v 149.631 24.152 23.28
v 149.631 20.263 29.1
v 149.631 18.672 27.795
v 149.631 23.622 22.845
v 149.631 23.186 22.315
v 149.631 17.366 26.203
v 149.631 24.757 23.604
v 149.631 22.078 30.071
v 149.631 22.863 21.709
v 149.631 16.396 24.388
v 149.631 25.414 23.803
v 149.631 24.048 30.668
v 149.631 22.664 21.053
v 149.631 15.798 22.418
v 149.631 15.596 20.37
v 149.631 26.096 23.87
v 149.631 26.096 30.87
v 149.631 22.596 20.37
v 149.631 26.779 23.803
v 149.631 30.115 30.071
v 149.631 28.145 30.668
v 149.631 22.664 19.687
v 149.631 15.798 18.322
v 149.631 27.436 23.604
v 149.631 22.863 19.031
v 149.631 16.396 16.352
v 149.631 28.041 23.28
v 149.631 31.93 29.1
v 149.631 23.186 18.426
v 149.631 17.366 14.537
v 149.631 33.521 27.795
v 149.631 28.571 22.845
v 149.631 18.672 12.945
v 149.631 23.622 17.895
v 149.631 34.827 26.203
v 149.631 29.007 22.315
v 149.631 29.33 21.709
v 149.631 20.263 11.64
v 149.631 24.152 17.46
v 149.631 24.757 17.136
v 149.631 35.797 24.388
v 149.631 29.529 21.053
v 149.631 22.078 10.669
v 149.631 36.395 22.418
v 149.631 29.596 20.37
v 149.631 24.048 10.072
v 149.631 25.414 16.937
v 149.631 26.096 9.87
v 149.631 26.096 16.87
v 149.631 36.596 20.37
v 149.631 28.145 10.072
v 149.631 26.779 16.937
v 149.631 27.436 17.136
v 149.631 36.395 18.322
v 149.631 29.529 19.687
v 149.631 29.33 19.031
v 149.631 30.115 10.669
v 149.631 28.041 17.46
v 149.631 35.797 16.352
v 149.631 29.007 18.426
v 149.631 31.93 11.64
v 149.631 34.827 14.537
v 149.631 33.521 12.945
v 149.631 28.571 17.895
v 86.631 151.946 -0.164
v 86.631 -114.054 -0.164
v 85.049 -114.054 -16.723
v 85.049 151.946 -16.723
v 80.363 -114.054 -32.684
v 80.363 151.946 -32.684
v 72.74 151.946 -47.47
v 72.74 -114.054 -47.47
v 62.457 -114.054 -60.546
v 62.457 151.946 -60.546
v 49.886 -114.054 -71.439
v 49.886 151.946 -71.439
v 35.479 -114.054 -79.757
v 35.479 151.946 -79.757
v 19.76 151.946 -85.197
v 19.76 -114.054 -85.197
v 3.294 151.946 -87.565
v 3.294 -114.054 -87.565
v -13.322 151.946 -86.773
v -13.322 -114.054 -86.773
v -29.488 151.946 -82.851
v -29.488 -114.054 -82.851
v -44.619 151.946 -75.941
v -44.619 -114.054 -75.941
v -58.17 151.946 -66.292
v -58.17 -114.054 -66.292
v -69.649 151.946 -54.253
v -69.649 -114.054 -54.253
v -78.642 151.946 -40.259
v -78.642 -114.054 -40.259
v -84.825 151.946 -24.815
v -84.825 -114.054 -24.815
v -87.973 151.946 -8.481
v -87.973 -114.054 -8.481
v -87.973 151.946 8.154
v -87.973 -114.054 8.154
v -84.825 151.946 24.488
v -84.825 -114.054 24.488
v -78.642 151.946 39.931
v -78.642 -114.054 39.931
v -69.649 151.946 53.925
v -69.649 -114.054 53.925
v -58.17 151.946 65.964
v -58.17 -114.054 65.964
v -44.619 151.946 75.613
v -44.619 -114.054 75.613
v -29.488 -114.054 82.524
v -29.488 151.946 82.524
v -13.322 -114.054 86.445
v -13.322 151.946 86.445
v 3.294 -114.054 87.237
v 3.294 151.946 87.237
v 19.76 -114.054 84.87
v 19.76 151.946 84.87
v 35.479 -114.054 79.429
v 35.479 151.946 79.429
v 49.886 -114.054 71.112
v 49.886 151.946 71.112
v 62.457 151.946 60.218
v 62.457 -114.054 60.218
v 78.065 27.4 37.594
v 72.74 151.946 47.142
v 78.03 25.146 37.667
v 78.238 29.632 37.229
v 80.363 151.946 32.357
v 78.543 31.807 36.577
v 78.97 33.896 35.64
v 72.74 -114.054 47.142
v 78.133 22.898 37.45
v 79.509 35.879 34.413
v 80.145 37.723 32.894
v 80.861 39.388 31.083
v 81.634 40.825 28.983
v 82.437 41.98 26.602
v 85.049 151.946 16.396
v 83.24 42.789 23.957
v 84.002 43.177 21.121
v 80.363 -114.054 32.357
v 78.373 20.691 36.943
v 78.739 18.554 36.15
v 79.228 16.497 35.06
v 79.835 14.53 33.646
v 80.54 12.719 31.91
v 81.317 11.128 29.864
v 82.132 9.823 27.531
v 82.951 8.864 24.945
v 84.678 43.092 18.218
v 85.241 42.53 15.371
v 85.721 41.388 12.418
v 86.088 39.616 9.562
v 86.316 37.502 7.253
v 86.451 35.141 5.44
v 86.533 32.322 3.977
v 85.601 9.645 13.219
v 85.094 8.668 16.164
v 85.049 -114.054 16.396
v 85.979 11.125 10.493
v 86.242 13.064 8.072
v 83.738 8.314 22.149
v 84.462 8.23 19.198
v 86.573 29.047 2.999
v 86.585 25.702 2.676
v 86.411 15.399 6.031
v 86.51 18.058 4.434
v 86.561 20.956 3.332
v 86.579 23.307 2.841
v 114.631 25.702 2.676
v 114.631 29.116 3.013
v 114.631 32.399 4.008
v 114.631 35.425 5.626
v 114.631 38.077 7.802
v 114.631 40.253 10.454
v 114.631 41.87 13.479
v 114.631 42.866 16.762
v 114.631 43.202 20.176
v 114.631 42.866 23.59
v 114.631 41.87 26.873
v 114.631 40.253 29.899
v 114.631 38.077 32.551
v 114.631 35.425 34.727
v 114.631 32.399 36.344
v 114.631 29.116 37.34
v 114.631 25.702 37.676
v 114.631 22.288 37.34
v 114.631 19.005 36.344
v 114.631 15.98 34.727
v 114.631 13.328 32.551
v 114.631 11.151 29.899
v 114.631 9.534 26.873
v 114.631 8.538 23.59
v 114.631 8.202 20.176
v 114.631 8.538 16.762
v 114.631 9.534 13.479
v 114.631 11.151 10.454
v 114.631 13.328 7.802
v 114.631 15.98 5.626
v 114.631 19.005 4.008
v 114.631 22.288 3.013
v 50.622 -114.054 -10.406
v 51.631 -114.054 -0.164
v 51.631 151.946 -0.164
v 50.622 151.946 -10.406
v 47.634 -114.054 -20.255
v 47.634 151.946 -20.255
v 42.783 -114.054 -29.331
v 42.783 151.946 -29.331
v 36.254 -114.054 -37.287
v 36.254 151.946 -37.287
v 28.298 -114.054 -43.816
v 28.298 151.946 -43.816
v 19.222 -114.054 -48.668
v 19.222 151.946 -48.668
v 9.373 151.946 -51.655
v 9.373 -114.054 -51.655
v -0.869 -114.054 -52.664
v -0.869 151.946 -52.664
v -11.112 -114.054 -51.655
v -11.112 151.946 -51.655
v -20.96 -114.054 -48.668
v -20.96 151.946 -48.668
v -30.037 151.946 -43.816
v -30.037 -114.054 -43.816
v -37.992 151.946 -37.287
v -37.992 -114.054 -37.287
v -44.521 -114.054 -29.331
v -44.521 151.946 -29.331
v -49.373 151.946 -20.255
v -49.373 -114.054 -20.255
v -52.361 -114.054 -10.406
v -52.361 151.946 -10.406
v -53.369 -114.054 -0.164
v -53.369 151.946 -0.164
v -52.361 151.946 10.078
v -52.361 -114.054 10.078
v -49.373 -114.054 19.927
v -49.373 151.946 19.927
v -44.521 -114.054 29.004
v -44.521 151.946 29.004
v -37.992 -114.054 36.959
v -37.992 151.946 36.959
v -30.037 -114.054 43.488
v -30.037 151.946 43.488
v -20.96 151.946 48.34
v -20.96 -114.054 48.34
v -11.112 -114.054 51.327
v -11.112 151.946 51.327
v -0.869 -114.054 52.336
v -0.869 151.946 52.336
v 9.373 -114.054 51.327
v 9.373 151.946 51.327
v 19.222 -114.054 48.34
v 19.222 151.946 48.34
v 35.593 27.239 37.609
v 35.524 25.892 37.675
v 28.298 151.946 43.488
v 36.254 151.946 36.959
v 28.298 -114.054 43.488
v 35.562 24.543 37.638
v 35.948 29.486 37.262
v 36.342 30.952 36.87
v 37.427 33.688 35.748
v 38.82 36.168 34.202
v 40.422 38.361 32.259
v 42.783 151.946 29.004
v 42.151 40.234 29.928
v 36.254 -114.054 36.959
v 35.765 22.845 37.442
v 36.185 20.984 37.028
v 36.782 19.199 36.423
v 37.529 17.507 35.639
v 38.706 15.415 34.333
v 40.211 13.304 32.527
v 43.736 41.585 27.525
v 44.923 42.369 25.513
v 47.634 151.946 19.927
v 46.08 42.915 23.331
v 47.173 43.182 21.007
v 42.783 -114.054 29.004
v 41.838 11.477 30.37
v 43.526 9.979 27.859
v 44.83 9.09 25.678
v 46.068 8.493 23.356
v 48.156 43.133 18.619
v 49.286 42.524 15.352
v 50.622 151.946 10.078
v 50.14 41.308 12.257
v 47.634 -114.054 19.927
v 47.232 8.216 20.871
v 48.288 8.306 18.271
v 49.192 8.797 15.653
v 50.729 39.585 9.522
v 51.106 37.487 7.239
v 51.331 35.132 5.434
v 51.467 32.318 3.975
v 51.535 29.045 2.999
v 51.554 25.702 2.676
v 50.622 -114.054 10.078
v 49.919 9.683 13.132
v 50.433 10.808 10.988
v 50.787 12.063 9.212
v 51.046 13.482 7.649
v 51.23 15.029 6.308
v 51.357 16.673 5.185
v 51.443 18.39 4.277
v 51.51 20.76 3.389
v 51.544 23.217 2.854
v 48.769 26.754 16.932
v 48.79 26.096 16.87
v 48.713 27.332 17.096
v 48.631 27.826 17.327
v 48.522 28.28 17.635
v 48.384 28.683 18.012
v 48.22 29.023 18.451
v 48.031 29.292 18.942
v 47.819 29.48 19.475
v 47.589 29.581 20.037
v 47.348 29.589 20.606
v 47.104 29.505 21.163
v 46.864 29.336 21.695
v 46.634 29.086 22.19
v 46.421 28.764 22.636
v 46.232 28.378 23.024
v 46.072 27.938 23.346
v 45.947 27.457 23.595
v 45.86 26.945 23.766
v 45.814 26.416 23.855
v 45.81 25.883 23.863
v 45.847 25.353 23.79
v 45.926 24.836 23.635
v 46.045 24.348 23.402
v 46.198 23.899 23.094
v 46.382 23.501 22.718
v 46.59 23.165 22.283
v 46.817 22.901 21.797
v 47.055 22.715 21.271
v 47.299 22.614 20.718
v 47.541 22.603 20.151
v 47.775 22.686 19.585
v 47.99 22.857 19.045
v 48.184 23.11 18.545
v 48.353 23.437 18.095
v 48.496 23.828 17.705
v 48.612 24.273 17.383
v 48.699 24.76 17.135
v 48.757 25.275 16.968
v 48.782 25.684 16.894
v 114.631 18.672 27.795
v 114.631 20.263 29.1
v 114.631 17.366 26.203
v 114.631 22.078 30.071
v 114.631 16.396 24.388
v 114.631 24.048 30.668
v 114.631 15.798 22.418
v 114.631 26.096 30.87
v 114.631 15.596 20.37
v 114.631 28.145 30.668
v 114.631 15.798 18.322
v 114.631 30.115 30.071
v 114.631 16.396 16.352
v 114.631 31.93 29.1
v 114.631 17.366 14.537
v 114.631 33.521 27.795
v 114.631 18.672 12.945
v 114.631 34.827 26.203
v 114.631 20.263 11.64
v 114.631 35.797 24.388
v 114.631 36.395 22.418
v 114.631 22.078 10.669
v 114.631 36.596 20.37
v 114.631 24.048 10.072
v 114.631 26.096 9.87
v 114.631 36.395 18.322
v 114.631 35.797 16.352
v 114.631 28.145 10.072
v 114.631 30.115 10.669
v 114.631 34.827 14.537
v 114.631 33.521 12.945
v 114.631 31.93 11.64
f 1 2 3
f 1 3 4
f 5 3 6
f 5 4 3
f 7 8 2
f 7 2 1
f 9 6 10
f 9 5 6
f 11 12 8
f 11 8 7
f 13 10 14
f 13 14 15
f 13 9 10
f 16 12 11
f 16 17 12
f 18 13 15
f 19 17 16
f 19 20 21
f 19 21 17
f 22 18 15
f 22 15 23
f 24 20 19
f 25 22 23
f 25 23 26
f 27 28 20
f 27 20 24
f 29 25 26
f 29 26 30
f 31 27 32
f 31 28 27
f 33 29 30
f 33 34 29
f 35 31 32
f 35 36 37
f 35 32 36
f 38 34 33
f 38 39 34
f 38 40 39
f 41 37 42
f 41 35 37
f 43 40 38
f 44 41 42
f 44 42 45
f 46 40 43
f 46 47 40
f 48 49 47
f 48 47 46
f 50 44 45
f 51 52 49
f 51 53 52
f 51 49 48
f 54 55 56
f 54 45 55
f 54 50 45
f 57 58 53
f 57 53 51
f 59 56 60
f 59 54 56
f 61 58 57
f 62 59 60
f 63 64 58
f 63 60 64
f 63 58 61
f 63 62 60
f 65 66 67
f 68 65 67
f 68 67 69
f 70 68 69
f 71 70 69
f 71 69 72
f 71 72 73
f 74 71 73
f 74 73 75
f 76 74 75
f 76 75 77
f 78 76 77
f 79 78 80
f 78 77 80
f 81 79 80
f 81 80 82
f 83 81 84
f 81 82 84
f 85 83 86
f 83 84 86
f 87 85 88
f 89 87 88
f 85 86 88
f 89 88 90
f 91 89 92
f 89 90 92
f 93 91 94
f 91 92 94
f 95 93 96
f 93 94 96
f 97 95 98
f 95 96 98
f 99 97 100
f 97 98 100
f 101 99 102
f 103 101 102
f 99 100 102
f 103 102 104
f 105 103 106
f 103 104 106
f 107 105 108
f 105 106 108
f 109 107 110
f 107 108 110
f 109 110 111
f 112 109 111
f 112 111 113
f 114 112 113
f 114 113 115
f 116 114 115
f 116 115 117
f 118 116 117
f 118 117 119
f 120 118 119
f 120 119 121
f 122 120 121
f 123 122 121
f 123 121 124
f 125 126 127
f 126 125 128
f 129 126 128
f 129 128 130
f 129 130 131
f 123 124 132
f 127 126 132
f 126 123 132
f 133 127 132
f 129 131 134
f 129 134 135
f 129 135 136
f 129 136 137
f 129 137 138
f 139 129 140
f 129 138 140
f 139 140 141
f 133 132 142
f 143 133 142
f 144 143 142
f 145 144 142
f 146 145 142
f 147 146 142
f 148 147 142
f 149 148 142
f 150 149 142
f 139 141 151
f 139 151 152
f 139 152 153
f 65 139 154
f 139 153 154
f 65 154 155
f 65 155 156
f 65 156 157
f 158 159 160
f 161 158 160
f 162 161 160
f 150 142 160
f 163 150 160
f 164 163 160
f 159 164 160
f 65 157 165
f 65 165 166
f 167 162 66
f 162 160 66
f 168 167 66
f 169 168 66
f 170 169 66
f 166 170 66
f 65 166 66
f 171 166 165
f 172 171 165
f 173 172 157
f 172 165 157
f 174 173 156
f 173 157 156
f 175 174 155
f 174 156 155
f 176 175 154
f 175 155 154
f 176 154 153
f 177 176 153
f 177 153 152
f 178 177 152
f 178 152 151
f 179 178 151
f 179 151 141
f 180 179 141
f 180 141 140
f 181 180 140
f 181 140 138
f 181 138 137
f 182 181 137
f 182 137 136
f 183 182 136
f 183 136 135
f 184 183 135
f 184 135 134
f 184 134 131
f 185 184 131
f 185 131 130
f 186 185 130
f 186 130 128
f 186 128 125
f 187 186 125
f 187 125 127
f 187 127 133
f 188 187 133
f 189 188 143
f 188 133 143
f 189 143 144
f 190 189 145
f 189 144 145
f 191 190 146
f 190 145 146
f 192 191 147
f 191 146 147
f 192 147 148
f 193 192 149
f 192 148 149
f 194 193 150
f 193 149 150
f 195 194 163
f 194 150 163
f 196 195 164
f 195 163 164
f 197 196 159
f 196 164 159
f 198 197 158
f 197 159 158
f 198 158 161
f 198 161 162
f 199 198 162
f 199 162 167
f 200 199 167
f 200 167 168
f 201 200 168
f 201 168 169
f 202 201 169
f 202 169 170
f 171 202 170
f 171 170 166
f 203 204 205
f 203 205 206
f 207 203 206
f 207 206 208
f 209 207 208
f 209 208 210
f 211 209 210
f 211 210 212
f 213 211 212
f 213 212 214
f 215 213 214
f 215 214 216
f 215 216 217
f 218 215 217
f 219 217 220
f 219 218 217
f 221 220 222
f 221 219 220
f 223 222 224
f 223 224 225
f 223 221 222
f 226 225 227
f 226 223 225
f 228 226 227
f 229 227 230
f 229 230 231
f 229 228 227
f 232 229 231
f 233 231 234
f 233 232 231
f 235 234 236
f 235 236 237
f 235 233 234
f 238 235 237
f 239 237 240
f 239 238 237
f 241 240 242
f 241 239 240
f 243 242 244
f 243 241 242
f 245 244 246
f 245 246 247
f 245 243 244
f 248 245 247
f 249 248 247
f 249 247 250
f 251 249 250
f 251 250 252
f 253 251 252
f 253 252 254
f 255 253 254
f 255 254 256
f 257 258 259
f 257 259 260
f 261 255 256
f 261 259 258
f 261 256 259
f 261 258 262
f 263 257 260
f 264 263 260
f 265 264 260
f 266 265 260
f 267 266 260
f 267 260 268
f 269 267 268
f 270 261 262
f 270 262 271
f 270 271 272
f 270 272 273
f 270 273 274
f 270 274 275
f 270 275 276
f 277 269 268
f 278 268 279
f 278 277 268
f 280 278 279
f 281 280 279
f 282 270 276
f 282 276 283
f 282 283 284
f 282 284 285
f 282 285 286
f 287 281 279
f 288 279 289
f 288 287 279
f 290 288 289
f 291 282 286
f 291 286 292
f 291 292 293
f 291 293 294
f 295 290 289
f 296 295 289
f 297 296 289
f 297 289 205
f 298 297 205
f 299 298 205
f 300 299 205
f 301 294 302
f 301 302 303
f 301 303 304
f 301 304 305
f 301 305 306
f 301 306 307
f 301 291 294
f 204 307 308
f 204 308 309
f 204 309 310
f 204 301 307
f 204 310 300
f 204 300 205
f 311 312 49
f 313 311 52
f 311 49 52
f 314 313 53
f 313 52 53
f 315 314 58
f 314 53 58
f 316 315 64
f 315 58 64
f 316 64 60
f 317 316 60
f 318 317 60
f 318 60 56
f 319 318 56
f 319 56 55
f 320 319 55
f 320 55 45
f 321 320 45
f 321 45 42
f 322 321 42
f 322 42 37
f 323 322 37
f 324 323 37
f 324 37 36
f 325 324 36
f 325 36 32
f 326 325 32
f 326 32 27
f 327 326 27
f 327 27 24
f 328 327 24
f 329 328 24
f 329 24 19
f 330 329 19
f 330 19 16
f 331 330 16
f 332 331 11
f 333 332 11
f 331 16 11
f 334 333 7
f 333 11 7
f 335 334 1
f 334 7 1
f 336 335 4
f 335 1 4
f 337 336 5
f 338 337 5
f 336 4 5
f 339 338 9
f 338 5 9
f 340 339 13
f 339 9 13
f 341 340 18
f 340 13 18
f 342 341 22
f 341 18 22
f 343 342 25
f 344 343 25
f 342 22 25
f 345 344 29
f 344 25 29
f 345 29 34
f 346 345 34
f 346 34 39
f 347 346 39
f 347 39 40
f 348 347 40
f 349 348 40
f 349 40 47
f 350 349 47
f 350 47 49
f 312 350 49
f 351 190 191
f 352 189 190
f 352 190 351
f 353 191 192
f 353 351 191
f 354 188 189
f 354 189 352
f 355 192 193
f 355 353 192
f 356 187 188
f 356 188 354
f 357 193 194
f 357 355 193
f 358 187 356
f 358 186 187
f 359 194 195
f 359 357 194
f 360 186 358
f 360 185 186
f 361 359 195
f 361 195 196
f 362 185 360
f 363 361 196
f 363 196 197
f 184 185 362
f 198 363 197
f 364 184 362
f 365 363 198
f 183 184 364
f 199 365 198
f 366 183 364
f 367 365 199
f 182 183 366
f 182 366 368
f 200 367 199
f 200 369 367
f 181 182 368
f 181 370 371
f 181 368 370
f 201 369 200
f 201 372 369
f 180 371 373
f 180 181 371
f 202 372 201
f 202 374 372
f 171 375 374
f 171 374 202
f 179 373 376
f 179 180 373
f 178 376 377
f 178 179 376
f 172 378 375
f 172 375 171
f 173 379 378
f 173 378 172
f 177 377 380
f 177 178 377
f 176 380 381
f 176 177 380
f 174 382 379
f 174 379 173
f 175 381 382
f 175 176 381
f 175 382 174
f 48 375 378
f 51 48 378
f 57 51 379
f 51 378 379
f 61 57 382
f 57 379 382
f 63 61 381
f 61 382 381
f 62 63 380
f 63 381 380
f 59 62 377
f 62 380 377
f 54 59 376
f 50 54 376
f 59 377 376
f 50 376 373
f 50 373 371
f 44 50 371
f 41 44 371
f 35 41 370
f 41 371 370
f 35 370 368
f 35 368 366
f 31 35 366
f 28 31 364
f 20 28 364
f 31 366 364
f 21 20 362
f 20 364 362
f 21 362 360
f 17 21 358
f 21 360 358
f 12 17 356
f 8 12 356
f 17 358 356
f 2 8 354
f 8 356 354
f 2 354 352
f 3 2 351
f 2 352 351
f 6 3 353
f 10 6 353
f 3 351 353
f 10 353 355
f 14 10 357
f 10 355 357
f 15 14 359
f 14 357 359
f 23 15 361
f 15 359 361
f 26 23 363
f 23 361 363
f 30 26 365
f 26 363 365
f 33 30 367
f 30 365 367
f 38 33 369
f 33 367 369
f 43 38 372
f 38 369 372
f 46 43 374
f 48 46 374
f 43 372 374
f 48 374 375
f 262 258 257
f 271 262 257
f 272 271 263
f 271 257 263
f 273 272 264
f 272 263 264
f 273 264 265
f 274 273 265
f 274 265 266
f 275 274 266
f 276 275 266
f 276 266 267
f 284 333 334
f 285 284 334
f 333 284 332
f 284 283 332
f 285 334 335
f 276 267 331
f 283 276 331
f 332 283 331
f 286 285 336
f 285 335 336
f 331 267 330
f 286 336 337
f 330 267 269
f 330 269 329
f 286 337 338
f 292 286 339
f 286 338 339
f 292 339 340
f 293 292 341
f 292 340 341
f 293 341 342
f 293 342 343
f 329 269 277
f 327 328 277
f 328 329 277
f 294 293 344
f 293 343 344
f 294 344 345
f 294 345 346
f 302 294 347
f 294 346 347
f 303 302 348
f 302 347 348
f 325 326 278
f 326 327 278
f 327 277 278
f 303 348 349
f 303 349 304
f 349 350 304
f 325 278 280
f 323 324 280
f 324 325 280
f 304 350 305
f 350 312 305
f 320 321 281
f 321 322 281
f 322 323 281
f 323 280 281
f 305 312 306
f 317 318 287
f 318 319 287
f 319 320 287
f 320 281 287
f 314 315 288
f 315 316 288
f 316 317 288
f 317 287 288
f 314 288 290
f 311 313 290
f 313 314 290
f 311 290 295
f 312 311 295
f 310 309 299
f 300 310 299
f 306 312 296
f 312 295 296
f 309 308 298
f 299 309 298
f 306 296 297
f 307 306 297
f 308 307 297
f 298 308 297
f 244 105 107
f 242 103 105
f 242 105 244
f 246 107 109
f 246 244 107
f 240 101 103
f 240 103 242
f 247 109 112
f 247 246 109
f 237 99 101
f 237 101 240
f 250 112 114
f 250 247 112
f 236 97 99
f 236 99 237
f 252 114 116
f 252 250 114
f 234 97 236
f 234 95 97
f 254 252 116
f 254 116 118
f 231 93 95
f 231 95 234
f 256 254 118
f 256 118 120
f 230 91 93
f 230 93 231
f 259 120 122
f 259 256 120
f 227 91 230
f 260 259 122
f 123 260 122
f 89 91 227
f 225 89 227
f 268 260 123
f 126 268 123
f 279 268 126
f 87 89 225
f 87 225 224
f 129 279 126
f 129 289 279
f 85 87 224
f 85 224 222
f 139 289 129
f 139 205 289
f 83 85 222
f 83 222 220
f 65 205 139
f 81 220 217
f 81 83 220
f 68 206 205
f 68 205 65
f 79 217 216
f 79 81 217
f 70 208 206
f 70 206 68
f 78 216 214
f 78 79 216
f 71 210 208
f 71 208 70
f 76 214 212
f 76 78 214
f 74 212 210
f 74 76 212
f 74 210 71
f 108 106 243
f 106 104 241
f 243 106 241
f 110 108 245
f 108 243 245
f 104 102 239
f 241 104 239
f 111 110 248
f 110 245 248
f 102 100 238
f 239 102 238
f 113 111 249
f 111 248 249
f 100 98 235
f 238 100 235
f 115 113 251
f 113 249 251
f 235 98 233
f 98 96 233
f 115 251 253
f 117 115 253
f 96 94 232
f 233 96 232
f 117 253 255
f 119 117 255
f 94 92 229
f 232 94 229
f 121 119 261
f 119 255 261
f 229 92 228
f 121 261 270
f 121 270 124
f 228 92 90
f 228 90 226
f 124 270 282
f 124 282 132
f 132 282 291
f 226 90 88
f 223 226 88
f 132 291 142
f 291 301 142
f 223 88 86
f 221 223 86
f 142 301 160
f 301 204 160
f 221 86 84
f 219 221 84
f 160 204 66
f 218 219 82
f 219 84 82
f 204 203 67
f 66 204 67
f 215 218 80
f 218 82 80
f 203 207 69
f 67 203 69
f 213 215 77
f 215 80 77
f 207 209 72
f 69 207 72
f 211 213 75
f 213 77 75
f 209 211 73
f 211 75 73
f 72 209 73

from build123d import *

# Parameters (mm, degrees)
CROQUIS1_R              = 12.5
CROQUIS1_R_2            = 7.5
SALIENTE_EXTRUIR1_DEPTH = 38
CROQUIS2_R              = 2.5
SALIENTE_EXTRUIR2_DEPTH = 16.5
CROQUIS3_R              = 7.5
CORTAR_EXTRUIR1_DEPTH   = 38
CROQUIS4_R              = 1.5
SALIENTE_EXTRUIR7_DEPTH = 5
CROQUIS5_R              = 0.5
CORTAR_EXTRUIR2_DEPTH   = 22
ESCALA1_SCALE           = 7


with BuildPart() as part:
    # Croquis1 → Saliente-Extruir1 (new body)
    with BuildSketch(Plane(origin=(0, 0, 0), x_dir=(1, 0, 0), z_dir=(0, 1, 0))):
        Circle(CROQUIS1_R)
        Circle(CROQUIS1_R_2, mode=Mode.SUBTRACT)
    extrude(amount=SALIENTE_EXTRUIR1_DEPTH)

    # Croquis2 → Saliente-Extruir2 (add)
    with BuildSketch(Plane(origin=(0, 0, 0), x_dir=(0, 0, -1), z_dir=(1, 0, 0))):
        with Locations((-2.905741876, 19.965132916)):
            Circle(CROQUIS2_R)
    extrude(amount=SALIENTE_EXTRUIR2_DEPTH)

    # Croquis3 → Cortar-Extruir1 (cut)
    with BuildSketch(Plane(origin=(0, 38, 0), x_dir=(1, 0, 0), z_dir=(0, 1, 0))):
        Circle(CROQUIS3_R)
    extrude(amount=-CORTAR_EXTRUIR1_DEPTH, mode=Mode.SUBTRACT)

    # Croquis4 → Saliente-Extruir7 (add)
    with BuildSketch(Plane(origin=(16.5, 0, 0), x_dir=(0, 0, -1), z_dir=(1, 0, 0))):
        with Locations((-2.933411735, 20.021455872)):
            Circle(CROQUIS4_R)
    extrude(amount=SALIENTE_EXTRUIR7_DEPTH)

    # Croquis5 → Cortar-Extruir2 (cut)
    with BuildSketch(Plane(origin=(21.5, 0, 0), x_dir=(0, 0, -1), z_dir=(1, 0, 0))):
        with Locations((-2.933411735, 20.021455872)):
            Circle(CROQUIS5_R)
    extrude(amount=-CORTAR_EXTRUIR2_DEPTH, mode=Mode.SUBTRACT)


with BuildPart() as part_1:
    # Escala1: scaled about (0.144888953, 19.008953835, 0.027312828)
    add(part.part.scale(ESCALA1_SCALE).moved(Location((-0.869333718, -114.05372301, -0.163876968))))


solid = part_1.part
